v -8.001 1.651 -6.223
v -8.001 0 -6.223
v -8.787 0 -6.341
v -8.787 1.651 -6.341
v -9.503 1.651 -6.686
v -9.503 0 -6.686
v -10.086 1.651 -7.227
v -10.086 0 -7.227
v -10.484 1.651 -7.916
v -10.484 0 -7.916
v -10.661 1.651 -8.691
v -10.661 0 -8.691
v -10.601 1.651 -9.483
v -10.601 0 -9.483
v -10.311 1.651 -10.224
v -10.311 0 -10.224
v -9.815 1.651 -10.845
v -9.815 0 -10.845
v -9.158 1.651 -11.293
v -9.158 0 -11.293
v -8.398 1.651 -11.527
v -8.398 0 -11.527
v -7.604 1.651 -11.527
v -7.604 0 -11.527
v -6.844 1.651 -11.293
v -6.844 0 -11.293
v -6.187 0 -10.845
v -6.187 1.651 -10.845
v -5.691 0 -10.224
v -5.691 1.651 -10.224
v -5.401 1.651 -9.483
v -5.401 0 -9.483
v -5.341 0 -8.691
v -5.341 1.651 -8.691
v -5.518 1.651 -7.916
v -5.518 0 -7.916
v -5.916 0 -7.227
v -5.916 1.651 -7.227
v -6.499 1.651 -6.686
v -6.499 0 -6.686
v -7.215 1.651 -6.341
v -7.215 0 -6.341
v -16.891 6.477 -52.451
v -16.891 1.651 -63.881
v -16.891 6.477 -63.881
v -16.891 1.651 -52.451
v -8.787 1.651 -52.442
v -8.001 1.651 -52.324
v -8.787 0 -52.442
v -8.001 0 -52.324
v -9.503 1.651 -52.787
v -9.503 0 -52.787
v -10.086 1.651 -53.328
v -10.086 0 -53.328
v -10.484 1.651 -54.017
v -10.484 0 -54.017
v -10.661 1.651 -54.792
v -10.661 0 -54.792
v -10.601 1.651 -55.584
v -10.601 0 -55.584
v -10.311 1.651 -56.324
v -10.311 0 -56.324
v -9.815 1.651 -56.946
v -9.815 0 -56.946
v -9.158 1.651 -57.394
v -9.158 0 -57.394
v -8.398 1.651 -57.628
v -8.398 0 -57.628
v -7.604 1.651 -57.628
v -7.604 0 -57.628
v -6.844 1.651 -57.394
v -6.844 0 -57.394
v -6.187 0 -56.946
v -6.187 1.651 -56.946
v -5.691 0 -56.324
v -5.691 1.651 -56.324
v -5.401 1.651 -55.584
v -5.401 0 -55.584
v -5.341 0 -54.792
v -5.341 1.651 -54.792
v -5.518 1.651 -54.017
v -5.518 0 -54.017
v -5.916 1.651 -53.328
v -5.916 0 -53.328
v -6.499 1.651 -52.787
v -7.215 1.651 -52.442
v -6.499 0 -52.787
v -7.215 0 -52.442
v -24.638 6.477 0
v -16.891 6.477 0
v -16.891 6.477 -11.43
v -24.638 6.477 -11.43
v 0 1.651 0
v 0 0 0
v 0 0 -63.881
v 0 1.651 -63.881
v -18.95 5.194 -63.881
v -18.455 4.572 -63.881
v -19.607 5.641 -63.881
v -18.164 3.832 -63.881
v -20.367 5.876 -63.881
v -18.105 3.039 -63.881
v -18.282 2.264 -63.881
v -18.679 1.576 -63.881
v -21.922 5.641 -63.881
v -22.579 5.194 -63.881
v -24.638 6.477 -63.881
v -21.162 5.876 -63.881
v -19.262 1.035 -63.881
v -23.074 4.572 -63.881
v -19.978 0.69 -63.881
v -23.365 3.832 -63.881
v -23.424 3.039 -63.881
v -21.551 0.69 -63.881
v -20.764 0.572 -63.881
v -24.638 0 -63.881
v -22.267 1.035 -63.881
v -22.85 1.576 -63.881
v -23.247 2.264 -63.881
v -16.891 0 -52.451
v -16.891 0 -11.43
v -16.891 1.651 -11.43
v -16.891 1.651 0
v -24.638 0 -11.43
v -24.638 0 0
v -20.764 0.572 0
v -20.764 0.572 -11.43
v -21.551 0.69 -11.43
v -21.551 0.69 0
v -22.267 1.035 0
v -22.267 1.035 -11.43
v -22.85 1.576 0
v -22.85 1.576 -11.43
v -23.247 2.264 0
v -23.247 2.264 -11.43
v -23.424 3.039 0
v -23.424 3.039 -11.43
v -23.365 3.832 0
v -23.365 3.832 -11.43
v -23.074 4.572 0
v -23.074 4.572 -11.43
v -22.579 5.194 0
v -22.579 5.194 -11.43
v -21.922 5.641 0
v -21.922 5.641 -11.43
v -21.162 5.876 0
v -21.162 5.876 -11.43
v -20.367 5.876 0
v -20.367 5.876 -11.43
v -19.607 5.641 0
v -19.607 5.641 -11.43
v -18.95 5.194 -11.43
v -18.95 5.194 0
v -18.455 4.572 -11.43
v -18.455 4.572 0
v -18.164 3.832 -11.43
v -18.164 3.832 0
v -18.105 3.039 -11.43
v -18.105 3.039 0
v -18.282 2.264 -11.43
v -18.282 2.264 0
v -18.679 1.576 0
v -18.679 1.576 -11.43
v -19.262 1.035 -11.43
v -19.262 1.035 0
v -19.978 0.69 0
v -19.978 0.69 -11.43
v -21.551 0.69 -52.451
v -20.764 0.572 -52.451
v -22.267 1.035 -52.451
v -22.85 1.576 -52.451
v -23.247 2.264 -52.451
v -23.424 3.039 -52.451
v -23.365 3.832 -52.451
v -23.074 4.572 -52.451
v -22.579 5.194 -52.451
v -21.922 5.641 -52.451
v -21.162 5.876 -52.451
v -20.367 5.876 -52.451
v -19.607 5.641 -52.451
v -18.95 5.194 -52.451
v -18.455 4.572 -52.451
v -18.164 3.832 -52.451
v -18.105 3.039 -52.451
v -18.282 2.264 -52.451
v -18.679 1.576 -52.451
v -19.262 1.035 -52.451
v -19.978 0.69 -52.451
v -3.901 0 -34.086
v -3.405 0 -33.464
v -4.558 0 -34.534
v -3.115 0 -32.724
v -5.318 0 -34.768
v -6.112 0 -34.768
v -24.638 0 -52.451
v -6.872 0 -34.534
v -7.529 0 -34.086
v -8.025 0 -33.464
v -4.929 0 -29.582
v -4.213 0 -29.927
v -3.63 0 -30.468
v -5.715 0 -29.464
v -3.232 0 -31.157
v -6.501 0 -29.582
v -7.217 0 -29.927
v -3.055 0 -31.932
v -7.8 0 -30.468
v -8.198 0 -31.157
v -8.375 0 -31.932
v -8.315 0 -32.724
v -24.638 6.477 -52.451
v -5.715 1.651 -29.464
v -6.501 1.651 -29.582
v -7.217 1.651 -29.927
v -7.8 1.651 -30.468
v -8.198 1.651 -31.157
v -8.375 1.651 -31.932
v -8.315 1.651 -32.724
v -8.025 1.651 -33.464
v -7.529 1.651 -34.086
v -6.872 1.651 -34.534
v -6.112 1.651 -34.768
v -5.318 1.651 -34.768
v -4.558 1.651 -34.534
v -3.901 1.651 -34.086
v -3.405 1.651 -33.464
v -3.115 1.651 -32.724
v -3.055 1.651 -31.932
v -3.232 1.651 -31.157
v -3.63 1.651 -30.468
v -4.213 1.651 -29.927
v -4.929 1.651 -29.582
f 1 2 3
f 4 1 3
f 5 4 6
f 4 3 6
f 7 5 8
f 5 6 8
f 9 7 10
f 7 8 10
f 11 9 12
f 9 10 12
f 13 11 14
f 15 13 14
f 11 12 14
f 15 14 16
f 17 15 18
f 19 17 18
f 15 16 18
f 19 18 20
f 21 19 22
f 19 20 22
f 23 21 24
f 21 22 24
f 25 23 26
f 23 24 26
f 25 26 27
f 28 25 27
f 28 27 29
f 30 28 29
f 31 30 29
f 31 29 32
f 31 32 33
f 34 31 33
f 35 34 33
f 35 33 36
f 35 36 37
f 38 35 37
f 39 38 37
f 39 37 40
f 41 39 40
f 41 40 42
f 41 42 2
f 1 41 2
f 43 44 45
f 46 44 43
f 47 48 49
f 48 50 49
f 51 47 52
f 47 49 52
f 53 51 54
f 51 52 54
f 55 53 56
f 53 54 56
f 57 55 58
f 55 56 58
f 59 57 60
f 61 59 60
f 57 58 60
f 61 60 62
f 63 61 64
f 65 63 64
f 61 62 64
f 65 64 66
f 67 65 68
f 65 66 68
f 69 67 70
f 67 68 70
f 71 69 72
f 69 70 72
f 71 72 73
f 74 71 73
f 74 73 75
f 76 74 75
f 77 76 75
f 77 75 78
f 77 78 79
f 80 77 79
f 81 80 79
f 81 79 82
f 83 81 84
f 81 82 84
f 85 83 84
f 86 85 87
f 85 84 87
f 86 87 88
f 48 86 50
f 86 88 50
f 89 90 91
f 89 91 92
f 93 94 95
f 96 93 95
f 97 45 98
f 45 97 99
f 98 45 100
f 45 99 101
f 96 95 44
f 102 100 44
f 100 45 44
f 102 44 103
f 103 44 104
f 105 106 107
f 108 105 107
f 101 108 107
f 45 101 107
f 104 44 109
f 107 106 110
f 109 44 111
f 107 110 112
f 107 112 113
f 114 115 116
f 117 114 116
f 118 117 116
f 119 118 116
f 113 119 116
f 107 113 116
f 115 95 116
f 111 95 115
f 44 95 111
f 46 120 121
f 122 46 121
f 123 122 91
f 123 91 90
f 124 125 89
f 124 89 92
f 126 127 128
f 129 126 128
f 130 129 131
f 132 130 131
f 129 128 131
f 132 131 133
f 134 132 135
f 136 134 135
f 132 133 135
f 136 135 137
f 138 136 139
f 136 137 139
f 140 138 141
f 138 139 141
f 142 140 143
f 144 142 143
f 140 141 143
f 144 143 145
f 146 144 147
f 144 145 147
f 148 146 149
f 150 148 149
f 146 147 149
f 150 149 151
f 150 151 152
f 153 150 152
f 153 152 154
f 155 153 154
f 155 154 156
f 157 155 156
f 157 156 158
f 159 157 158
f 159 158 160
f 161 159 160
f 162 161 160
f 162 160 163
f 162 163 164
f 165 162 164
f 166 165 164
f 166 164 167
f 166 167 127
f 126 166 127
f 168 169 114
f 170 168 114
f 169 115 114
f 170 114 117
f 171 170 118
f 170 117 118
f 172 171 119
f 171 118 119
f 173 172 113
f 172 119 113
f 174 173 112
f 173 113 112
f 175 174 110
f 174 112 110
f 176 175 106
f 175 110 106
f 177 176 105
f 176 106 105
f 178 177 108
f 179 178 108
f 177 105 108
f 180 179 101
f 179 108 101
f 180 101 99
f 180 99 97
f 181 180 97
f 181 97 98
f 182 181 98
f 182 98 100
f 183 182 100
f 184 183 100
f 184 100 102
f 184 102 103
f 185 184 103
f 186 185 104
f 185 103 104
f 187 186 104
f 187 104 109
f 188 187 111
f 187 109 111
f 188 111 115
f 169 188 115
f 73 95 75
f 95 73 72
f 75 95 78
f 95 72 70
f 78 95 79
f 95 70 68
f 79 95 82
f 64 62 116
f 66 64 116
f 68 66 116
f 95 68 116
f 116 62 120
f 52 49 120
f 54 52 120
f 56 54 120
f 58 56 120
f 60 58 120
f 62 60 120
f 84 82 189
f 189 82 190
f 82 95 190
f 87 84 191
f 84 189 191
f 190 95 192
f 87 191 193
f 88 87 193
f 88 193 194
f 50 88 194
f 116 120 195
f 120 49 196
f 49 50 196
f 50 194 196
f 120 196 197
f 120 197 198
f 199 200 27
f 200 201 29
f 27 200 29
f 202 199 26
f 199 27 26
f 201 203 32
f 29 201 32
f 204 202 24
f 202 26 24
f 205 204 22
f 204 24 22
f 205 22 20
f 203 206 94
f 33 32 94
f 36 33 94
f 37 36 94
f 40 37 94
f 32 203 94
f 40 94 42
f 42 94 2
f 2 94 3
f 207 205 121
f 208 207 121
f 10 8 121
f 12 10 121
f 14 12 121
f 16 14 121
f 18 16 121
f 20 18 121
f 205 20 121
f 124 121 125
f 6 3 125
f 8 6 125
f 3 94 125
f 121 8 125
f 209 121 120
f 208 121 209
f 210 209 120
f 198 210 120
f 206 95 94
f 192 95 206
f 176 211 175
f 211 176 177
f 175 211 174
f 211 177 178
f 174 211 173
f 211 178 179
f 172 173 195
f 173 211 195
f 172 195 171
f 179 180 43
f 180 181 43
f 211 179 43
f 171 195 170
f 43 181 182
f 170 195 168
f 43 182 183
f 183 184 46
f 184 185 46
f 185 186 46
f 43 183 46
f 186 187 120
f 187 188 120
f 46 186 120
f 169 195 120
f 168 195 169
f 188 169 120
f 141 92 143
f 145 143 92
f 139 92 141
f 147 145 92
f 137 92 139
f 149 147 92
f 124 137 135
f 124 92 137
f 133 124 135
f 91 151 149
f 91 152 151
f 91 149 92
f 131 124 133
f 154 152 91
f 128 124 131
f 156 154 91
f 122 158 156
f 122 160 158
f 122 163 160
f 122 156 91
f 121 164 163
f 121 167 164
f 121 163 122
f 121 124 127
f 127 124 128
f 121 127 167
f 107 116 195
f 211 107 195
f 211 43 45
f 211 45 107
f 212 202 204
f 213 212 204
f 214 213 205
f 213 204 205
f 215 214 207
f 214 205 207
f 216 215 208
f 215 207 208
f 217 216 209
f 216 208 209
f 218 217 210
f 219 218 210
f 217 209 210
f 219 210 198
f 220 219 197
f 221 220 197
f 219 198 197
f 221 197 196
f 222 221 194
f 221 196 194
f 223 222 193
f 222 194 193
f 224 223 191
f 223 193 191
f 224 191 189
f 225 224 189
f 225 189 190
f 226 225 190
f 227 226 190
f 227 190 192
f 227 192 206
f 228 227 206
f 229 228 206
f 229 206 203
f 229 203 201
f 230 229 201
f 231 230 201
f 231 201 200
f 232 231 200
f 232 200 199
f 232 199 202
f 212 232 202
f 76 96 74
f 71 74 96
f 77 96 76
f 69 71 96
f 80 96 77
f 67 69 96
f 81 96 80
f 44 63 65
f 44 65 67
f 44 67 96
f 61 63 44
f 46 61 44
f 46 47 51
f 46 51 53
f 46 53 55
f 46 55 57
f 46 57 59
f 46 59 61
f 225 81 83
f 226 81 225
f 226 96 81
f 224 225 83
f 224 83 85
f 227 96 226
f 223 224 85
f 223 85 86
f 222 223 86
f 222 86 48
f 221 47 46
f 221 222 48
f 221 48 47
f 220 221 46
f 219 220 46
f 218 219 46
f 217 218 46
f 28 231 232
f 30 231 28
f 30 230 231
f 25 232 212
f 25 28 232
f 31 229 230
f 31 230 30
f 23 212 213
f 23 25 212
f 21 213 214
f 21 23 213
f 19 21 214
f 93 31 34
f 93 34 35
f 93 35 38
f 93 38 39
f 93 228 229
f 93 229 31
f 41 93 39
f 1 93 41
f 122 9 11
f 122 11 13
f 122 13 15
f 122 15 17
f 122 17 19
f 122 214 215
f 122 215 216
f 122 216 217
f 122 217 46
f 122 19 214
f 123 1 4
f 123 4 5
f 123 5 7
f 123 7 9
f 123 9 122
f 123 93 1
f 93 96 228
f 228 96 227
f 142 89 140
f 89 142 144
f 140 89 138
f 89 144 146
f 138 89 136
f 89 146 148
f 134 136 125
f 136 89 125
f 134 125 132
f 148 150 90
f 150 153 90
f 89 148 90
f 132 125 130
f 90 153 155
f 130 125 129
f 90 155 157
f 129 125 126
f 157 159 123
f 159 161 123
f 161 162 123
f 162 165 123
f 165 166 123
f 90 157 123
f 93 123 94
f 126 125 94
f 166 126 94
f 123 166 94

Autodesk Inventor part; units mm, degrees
ref_plane "YZ Plane" through (0, 0, 0) normal (1, 0, 0) x (0, 1, 0)
ref_plane "XZ Plane" through (0, 0, 0) normal (0, 1, 0) x (-1, 0, 0)
ref_plane "XY Plane" through (0, 0, 0) normal (0, 0, 1) x (1, 0, 0)
sketch "Sketch1" plane through (0, 0, 0) normal (0, 1, 0) x (-1, 0, 0)
  line L0 (0, 0) -> (0, -63.881)
  line L1 (0, -63.881) -> (16.891, -63.881)
  line L2 (16.891, -63.881) -> (16.891, 0)
  line L3 (16.891, 0) -> (0, 0)
  line L4 (16.891, 0) -> (24.638, 0)
  line L5 (24.638, 0) -> (24.638, -11.43)
  line L6 (24.638, -11.43) -> (16.891, -11.43)
  line L7 (16.891, -63.881) -> (24.638, -63.881)
  line L8 (24.638, -63.881) -> (24.638, -52.451)
  line L9 (24.638, -52.451) -> (16.891, -52.451)
  dimension "d0" = 63.881
  dimension "d1" = 16.891
  dimension "d2" = 7.747
  dimension "d3" = 11.43
  dimension "d4" = 7.747
  dimension "d5" = 11.43
extrude "Extrusion1" add sketch "Sketch1" along normal blind 1.651 contours L3 L2 L1 L0
extrude "Extrusion2" add sketch "Sketch1" along normal blind 6.477 contours L4 L5 L6 L2
extrude "Extrusion3" add sketch "Sketch1" along normal blind 6.477 contours L2 L9 L8 L7
hole "Hole1" at (-8.001, 1.651, -8.89) direction (0, -1, 0) diameter 5.334 end through all
hole "Hole2" at (-8.001, 1.651, -54.991) direction (0, -1, 0) diameter 5.334 end through all
hole "Hole3" at (-5.715, 1.651, -32.131) direction (0, -1, 0) diameter 5.334 end through all
hole "Hole4" at (-20.7645, 3.2385, 0) direction (0, 0, -1) diameter 5.334 end through all
properties part number "door hinge for conveyor"
